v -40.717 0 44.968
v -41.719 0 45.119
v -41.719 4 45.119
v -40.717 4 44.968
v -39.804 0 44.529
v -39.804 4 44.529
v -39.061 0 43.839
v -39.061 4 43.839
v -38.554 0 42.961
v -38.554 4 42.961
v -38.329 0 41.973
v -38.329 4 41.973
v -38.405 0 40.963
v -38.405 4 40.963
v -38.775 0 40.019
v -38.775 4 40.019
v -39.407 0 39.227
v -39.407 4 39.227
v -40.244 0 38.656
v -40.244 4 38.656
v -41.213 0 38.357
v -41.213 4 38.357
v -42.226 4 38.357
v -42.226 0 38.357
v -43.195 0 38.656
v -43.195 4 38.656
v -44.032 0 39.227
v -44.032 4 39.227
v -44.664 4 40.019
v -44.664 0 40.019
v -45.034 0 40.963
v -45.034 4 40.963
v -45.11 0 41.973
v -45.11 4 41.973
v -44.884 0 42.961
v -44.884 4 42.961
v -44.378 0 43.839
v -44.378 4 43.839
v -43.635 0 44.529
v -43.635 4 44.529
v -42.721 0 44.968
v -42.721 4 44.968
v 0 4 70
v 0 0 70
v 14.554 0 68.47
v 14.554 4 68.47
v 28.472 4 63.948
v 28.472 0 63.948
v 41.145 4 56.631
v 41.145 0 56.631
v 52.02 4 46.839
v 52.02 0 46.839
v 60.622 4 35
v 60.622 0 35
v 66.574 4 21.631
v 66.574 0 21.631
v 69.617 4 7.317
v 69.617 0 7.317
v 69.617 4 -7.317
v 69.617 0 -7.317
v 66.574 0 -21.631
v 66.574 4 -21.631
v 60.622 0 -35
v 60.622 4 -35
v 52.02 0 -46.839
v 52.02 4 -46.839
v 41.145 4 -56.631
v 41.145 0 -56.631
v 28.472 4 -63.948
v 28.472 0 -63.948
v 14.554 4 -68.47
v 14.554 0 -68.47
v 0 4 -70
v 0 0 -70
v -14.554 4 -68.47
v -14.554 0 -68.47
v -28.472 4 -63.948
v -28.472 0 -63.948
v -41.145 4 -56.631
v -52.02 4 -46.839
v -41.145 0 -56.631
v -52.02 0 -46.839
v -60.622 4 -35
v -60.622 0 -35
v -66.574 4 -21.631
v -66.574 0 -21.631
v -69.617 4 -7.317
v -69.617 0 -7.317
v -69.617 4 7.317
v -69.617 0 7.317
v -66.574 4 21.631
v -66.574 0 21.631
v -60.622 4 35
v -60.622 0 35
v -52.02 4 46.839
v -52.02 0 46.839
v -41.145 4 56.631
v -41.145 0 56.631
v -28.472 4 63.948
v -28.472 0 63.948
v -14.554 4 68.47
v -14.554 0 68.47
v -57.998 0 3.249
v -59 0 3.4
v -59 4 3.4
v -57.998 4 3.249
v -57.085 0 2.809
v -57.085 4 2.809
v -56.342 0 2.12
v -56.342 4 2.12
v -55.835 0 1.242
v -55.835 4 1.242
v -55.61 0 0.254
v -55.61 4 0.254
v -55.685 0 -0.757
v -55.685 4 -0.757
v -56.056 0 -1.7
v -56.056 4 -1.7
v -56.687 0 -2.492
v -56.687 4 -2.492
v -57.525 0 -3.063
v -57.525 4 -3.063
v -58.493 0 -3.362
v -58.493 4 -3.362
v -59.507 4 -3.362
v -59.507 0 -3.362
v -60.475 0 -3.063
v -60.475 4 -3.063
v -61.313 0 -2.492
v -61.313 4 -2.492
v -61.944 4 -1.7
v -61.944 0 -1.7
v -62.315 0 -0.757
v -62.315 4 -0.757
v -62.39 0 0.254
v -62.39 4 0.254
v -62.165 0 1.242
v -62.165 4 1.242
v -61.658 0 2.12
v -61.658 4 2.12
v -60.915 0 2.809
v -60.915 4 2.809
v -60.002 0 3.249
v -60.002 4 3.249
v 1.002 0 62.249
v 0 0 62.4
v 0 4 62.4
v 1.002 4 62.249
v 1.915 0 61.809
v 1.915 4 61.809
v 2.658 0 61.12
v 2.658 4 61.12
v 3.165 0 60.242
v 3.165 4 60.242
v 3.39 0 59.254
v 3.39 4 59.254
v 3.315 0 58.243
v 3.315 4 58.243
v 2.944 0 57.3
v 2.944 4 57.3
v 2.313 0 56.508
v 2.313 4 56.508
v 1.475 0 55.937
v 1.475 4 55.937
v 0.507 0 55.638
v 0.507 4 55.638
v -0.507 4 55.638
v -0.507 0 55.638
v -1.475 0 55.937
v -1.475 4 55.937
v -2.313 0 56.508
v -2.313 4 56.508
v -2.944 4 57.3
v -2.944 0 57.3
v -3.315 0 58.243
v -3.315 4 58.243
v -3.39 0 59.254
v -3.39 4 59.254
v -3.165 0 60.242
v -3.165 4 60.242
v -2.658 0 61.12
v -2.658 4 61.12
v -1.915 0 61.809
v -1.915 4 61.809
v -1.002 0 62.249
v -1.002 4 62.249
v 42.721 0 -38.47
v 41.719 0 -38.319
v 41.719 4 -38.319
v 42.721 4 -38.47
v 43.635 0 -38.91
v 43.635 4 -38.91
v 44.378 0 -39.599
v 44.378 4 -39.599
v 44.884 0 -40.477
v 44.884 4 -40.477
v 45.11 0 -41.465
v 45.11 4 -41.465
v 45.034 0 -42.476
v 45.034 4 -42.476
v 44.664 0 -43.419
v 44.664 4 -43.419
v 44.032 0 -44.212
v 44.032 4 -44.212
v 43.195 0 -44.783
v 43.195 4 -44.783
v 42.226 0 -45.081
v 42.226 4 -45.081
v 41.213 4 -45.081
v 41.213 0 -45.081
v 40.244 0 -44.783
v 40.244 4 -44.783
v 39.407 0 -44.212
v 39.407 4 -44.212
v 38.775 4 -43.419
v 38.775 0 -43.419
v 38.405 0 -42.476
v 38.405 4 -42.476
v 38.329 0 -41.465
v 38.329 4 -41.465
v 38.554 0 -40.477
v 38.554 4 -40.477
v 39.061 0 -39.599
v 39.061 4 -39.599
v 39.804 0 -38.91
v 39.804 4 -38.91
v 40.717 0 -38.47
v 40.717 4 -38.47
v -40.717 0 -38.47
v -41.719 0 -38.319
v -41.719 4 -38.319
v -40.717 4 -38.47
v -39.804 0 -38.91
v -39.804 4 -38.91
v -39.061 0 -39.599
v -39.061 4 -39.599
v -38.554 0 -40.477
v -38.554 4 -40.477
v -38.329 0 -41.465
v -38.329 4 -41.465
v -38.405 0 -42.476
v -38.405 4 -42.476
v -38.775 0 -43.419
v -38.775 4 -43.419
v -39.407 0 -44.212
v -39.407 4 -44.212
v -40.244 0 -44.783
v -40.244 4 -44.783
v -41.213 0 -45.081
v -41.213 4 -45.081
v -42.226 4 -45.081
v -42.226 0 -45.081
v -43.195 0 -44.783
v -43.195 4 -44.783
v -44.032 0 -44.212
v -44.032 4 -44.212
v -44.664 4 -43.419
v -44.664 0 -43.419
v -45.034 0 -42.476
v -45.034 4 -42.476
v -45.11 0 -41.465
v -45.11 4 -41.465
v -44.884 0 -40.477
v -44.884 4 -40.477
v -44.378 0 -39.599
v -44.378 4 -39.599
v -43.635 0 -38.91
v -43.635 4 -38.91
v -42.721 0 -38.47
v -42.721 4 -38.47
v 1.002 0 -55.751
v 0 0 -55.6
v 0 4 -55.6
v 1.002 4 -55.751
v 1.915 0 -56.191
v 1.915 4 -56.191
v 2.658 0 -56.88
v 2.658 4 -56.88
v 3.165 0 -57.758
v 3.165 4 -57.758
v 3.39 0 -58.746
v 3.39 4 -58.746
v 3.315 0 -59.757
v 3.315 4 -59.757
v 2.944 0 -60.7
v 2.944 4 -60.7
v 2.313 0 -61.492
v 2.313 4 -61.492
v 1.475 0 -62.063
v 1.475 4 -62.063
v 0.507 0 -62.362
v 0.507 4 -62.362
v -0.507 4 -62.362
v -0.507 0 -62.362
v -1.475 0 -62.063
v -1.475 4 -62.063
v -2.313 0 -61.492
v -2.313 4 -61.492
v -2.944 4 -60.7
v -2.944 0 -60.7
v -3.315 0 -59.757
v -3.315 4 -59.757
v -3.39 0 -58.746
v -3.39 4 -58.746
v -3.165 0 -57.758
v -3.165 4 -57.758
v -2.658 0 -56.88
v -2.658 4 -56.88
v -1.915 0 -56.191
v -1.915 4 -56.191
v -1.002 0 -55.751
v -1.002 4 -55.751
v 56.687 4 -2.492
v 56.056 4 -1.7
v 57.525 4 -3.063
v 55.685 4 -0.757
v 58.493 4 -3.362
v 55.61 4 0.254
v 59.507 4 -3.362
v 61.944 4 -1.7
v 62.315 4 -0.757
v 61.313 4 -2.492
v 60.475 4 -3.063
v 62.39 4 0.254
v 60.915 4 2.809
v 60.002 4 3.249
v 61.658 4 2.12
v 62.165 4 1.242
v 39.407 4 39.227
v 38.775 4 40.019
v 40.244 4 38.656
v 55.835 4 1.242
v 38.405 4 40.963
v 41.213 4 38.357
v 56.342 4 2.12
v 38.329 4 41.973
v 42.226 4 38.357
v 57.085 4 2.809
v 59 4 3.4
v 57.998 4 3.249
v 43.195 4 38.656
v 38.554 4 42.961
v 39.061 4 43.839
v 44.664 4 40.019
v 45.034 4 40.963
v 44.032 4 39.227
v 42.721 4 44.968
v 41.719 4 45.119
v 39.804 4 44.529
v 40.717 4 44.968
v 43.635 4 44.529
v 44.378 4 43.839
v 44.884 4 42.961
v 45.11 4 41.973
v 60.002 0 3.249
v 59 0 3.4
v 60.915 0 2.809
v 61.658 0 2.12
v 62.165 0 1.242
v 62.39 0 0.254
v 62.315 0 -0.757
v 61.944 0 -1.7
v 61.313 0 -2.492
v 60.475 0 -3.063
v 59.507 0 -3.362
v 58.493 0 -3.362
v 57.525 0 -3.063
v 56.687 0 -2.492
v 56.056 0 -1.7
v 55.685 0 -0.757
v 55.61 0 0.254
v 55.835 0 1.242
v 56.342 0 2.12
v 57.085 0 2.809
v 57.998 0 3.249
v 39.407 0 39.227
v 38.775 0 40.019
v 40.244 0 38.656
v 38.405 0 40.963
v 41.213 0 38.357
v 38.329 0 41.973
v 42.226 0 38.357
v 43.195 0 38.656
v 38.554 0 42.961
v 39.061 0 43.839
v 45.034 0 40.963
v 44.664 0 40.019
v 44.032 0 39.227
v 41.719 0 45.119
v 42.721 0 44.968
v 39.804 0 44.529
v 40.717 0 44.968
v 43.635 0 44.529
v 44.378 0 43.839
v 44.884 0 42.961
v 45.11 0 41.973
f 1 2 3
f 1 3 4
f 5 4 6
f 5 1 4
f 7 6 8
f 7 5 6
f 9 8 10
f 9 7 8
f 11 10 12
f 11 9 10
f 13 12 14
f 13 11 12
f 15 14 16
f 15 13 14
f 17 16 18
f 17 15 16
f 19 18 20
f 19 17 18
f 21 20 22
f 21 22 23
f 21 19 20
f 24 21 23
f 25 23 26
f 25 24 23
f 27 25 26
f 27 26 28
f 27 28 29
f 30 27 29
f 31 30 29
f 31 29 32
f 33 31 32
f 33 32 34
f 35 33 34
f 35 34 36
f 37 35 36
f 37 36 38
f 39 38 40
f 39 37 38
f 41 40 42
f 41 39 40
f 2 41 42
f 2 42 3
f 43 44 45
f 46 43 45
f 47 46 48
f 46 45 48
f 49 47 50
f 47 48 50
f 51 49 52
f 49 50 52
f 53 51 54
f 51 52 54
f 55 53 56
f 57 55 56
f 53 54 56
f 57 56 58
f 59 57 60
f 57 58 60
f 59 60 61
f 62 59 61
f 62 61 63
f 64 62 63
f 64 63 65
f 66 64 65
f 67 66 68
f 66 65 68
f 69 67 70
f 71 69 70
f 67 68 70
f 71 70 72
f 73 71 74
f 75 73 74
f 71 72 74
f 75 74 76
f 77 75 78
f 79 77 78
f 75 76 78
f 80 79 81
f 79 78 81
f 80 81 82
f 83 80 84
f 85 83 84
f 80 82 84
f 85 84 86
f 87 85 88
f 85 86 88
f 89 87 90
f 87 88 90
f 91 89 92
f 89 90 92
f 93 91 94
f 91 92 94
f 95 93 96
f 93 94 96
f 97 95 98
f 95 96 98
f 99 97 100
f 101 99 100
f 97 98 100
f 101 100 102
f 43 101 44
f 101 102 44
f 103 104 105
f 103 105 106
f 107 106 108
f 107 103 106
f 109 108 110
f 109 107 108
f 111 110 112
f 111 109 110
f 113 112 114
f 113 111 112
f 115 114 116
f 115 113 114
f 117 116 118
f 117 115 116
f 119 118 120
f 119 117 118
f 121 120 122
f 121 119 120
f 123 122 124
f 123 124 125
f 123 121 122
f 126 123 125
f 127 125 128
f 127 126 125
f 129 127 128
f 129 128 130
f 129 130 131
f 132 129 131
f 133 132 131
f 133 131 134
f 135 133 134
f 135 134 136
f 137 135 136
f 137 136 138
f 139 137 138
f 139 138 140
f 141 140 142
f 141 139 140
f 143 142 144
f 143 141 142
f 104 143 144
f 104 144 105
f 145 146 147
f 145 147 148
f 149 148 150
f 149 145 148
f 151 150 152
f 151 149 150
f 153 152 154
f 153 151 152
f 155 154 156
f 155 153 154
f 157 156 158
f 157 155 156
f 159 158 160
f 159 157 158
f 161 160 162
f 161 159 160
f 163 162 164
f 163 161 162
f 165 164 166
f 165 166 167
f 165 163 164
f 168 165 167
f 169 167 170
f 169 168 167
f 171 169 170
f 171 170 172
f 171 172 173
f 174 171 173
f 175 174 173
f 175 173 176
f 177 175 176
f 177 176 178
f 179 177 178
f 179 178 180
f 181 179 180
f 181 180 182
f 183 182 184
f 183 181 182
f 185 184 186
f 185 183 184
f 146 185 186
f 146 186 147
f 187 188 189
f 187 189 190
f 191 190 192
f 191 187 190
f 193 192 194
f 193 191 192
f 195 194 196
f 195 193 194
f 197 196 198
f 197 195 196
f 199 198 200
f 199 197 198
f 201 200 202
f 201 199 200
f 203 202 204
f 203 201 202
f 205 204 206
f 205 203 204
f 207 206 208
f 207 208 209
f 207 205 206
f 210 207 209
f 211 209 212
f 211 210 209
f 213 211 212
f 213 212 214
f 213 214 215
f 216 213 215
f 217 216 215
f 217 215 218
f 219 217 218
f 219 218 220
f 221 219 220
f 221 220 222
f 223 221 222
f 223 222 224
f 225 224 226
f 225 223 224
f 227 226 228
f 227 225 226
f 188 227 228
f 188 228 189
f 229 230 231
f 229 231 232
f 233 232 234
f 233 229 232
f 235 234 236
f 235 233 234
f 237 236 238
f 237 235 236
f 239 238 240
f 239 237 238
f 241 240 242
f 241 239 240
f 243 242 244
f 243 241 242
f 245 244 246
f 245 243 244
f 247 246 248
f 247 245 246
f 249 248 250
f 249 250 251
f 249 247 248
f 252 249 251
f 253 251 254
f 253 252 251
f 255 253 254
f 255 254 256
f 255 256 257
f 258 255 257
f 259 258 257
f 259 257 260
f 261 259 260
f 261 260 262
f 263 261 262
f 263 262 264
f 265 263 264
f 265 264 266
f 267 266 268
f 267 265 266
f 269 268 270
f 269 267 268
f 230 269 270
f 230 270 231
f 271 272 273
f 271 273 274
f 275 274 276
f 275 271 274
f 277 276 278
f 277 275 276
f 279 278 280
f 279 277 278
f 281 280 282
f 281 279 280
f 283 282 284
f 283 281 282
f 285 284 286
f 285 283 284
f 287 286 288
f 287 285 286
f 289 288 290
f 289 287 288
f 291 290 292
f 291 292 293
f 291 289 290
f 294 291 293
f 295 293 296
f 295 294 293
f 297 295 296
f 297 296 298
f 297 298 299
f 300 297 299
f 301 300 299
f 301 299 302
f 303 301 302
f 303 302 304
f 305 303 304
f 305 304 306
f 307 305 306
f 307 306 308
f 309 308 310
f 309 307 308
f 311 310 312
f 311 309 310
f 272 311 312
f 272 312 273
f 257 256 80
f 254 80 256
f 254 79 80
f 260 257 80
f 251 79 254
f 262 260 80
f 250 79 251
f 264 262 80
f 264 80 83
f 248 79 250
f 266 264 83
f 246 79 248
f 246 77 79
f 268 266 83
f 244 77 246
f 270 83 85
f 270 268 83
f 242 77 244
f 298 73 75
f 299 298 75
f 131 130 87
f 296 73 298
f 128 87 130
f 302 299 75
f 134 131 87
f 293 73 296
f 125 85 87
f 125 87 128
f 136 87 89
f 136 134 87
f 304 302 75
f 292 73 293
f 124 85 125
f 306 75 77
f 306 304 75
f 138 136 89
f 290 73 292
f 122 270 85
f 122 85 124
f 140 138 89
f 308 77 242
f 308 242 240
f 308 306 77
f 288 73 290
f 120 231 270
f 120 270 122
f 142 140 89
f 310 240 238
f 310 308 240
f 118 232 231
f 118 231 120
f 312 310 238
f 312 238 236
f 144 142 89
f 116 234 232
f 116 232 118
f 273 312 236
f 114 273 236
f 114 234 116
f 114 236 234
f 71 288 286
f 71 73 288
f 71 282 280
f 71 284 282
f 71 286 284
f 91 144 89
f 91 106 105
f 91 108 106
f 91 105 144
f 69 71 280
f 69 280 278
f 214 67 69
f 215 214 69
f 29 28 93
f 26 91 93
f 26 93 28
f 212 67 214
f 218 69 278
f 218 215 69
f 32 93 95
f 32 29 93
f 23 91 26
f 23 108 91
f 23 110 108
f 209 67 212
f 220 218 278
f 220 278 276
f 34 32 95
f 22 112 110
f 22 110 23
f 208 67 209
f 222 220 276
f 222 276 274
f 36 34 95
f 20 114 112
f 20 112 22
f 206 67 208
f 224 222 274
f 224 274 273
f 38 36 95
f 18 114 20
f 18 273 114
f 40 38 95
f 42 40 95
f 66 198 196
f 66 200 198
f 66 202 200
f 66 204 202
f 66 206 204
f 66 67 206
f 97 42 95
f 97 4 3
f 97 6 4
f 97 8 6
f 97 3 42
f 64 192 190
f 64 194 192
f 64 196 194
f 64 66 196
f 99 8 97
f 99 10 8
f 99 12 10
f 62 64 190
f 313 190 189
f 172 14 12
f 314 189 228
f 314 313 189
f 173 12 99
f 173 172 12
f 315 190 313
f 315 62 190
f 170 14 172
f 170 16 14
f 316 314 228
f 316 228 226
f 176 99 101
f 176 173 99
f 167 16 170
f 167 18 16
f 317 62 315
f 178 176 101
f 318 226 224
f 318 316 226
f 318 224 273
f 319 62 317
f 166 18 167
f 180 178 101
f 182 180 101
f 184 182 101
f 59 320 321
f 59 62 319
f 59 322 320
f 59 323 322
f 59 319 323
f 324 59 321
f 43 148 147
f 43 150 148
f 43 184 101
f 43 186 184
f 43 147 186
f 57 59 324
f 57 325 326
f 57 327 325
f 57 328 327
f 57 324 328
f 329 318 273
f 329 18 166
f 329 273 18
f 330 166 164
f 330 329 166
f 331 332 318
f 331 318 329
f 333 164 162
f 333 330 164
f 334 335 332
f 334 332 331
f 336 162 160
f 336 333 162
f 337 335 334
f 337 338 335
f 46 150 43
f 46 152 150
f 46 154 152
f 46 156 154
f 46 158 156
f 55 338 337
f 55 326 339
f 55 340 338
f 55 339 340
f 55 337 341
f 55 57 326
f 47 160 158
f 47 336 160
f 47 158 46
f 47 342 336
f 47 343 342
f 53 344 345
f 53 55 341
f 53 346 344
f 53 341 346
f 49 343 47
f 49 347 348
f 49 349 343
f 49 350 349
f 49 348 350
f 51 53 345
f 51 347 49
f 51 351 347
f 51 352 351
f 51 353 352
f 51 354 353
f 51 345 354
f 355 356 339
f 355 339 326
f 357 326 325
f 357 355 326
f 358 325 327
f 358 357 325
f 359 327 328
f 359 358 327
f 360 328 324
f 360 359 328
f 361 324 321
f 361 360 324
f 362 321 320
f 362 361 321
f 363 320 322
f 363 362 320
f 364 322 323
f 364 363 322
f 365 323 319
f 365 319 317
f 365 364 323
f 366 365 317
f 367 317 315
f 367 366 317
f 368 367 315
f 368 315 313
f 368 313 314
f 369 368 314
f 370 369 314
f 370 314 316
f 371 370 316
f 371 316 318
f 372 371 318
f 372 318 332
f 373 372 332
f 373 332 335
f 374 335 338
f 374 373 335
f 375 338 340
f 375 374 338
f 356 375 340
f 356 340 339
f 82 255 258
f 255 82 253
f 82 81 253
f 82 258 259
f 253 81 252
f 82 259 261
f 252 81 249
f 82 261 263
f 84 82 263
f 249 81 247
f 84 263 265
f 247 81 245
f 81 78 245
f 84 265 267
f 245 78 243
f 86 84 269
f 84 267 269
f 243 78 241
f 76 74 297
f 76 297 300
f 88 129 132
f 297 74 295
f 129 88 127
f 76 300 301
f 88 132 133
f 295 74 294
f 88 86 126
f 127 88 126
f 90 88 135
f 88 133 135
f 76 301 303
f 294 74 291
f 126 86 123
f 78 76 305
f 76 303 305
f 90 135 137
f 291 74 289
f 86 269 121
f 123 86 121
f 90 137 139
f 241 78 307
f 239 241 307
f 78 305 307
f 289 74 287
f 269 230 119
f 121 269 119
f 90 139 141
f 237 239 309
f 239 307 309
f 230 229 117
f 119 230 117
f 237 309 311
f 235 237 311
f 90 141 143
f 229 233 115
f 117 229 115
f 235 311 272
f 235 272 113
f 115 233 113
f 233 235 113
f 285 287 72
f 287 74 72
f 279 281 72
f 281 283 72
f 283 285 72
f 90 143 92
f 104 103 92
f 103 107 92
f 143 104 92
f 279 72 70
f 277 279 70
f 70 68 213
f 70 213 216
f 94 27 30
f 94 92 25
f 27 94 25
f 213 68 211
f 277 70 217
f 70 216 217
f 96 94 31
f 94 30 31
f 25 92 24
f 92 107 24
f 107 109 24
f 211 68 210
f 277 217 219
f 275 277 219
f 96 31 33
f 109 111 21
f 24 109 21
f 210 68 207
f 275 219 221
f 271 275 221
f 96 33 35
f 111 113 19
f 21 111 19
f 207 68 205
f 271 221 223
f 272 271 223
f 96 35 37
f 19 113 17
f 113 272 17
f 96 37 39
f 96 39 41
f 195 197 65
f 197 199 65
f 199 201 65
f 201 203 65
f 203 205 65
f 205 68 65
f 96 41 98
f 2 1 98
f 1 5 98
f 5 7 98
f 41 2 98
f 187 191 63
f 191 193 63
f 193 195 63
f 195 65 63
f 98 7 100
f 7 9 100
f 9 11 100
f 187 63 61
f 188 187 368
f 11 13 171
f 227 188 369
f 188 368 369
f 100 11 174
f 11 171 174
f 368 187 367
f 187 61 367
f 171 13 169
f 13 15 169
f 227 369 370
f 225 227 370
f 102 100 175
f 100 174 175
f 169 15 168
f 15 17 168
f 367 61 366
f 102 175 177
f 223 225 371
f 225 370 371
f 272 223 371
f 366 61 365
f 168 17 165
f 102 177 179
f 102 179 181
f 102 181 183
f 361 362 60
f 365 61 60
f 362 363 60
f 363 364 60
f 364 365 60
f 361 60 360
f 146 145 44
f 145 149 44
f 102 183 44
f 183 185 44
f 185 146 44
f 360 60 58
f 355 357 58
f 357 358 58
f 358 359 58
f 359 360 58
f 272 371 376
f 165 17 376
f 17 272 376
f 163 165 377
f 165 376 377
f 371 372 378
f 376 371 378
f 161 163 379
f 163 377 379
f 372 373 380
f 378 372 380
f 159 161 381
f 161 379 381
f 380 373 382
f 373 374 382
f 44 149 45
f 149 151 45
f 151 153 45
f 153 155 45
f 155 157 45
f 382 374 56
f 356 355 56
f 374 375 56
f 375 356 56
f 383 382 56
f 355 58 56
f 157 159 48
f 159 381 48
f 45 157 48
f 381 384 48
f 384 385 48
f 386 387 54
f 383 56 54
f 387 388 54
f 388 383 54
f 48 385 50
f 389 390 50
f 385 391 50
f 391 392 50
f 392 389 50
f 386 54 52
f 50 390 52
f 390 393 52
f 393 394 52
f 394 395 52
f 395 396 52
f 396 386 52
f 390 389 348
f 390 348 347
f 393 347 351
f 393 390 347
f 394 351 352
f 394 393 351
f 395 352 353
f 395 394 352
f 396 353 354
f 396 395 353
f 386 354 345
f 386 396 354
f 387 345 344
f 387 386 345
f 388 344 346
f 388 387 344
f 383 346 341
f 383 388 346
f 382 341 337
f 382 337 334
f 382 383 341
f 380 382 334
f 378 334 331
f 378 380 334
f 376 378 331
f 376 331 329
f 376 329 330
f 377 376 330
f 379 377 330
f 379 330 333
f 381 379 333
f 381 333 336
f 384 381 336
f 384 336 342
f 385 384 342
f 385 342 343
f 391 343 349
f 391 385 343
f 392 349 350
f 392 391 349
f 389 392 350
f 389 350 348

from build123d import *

# Parameters (mm, degrees)
SKETCH_1_R      = 70
SKETCH_1_R_2    = 3.4
EXTRUDE_1_DEPTH = 4


with BuildPart() as part:
    # Эскиз1 → Бобышка-Вытянуть1 (new body)
    with BuildSketch(Plane(origin=(0, 0, 0), x_dir=(1, 0, 0), z_dir=(0, 1, 0))):
        with Locations(Location((0, 0, 0), (0, 0, 270))):
            Circle(SKETCH_1_R)
        with Locations(Location((59, 0, 0), (0, 0, 270))):
            Circle(SKETCH_1_R_2, mode=Mode.SUBTRACT)
        with Locations(Location((41.71930009, -41.71930009, 0), (0, 0, 270))):
            Circle(SKETCH_1_R_2, mode=Mode.SUBTRACT)
        with Locations(Location((0, -59, 0), (0, 0, 270))):
            Circle(SKETCH_1_R_2, mode=Mode.SUBTRACT)
        with Locations(Location((-41.71930009, -41.71930009, 0), (0, 0, 270))):
            Circle(SKETCH_1_R_2, mode=Mode.SUBTRACT)
        with Locations(Location((-59, 0, 0), (0, 0, 270))):
            Circle(SKETCH_1_R_2, mode=Mode.SUBTRACT)
        with Locations(Location((-41.71930009, 41.71930009, 0), (0, 0, 270))):
            Circle(SKETCH_1_R_2, mode=Mode.SUBTRACT)
        with Locations(Location((0, 59, 0), (0, 0, 270))):
            Circle(SKETCH_1_R_2, mode=Mode.SUBTRACT)
        with Locations(Location((41.71930009, 41.71930009, 0), (0, 0, 270))):
            Circle(SKETCH_1_R_2, mode=Mode.SUBTRACT)
    extrude(amount=EXTRUDE_1_DEPTH)


solid = part.part
